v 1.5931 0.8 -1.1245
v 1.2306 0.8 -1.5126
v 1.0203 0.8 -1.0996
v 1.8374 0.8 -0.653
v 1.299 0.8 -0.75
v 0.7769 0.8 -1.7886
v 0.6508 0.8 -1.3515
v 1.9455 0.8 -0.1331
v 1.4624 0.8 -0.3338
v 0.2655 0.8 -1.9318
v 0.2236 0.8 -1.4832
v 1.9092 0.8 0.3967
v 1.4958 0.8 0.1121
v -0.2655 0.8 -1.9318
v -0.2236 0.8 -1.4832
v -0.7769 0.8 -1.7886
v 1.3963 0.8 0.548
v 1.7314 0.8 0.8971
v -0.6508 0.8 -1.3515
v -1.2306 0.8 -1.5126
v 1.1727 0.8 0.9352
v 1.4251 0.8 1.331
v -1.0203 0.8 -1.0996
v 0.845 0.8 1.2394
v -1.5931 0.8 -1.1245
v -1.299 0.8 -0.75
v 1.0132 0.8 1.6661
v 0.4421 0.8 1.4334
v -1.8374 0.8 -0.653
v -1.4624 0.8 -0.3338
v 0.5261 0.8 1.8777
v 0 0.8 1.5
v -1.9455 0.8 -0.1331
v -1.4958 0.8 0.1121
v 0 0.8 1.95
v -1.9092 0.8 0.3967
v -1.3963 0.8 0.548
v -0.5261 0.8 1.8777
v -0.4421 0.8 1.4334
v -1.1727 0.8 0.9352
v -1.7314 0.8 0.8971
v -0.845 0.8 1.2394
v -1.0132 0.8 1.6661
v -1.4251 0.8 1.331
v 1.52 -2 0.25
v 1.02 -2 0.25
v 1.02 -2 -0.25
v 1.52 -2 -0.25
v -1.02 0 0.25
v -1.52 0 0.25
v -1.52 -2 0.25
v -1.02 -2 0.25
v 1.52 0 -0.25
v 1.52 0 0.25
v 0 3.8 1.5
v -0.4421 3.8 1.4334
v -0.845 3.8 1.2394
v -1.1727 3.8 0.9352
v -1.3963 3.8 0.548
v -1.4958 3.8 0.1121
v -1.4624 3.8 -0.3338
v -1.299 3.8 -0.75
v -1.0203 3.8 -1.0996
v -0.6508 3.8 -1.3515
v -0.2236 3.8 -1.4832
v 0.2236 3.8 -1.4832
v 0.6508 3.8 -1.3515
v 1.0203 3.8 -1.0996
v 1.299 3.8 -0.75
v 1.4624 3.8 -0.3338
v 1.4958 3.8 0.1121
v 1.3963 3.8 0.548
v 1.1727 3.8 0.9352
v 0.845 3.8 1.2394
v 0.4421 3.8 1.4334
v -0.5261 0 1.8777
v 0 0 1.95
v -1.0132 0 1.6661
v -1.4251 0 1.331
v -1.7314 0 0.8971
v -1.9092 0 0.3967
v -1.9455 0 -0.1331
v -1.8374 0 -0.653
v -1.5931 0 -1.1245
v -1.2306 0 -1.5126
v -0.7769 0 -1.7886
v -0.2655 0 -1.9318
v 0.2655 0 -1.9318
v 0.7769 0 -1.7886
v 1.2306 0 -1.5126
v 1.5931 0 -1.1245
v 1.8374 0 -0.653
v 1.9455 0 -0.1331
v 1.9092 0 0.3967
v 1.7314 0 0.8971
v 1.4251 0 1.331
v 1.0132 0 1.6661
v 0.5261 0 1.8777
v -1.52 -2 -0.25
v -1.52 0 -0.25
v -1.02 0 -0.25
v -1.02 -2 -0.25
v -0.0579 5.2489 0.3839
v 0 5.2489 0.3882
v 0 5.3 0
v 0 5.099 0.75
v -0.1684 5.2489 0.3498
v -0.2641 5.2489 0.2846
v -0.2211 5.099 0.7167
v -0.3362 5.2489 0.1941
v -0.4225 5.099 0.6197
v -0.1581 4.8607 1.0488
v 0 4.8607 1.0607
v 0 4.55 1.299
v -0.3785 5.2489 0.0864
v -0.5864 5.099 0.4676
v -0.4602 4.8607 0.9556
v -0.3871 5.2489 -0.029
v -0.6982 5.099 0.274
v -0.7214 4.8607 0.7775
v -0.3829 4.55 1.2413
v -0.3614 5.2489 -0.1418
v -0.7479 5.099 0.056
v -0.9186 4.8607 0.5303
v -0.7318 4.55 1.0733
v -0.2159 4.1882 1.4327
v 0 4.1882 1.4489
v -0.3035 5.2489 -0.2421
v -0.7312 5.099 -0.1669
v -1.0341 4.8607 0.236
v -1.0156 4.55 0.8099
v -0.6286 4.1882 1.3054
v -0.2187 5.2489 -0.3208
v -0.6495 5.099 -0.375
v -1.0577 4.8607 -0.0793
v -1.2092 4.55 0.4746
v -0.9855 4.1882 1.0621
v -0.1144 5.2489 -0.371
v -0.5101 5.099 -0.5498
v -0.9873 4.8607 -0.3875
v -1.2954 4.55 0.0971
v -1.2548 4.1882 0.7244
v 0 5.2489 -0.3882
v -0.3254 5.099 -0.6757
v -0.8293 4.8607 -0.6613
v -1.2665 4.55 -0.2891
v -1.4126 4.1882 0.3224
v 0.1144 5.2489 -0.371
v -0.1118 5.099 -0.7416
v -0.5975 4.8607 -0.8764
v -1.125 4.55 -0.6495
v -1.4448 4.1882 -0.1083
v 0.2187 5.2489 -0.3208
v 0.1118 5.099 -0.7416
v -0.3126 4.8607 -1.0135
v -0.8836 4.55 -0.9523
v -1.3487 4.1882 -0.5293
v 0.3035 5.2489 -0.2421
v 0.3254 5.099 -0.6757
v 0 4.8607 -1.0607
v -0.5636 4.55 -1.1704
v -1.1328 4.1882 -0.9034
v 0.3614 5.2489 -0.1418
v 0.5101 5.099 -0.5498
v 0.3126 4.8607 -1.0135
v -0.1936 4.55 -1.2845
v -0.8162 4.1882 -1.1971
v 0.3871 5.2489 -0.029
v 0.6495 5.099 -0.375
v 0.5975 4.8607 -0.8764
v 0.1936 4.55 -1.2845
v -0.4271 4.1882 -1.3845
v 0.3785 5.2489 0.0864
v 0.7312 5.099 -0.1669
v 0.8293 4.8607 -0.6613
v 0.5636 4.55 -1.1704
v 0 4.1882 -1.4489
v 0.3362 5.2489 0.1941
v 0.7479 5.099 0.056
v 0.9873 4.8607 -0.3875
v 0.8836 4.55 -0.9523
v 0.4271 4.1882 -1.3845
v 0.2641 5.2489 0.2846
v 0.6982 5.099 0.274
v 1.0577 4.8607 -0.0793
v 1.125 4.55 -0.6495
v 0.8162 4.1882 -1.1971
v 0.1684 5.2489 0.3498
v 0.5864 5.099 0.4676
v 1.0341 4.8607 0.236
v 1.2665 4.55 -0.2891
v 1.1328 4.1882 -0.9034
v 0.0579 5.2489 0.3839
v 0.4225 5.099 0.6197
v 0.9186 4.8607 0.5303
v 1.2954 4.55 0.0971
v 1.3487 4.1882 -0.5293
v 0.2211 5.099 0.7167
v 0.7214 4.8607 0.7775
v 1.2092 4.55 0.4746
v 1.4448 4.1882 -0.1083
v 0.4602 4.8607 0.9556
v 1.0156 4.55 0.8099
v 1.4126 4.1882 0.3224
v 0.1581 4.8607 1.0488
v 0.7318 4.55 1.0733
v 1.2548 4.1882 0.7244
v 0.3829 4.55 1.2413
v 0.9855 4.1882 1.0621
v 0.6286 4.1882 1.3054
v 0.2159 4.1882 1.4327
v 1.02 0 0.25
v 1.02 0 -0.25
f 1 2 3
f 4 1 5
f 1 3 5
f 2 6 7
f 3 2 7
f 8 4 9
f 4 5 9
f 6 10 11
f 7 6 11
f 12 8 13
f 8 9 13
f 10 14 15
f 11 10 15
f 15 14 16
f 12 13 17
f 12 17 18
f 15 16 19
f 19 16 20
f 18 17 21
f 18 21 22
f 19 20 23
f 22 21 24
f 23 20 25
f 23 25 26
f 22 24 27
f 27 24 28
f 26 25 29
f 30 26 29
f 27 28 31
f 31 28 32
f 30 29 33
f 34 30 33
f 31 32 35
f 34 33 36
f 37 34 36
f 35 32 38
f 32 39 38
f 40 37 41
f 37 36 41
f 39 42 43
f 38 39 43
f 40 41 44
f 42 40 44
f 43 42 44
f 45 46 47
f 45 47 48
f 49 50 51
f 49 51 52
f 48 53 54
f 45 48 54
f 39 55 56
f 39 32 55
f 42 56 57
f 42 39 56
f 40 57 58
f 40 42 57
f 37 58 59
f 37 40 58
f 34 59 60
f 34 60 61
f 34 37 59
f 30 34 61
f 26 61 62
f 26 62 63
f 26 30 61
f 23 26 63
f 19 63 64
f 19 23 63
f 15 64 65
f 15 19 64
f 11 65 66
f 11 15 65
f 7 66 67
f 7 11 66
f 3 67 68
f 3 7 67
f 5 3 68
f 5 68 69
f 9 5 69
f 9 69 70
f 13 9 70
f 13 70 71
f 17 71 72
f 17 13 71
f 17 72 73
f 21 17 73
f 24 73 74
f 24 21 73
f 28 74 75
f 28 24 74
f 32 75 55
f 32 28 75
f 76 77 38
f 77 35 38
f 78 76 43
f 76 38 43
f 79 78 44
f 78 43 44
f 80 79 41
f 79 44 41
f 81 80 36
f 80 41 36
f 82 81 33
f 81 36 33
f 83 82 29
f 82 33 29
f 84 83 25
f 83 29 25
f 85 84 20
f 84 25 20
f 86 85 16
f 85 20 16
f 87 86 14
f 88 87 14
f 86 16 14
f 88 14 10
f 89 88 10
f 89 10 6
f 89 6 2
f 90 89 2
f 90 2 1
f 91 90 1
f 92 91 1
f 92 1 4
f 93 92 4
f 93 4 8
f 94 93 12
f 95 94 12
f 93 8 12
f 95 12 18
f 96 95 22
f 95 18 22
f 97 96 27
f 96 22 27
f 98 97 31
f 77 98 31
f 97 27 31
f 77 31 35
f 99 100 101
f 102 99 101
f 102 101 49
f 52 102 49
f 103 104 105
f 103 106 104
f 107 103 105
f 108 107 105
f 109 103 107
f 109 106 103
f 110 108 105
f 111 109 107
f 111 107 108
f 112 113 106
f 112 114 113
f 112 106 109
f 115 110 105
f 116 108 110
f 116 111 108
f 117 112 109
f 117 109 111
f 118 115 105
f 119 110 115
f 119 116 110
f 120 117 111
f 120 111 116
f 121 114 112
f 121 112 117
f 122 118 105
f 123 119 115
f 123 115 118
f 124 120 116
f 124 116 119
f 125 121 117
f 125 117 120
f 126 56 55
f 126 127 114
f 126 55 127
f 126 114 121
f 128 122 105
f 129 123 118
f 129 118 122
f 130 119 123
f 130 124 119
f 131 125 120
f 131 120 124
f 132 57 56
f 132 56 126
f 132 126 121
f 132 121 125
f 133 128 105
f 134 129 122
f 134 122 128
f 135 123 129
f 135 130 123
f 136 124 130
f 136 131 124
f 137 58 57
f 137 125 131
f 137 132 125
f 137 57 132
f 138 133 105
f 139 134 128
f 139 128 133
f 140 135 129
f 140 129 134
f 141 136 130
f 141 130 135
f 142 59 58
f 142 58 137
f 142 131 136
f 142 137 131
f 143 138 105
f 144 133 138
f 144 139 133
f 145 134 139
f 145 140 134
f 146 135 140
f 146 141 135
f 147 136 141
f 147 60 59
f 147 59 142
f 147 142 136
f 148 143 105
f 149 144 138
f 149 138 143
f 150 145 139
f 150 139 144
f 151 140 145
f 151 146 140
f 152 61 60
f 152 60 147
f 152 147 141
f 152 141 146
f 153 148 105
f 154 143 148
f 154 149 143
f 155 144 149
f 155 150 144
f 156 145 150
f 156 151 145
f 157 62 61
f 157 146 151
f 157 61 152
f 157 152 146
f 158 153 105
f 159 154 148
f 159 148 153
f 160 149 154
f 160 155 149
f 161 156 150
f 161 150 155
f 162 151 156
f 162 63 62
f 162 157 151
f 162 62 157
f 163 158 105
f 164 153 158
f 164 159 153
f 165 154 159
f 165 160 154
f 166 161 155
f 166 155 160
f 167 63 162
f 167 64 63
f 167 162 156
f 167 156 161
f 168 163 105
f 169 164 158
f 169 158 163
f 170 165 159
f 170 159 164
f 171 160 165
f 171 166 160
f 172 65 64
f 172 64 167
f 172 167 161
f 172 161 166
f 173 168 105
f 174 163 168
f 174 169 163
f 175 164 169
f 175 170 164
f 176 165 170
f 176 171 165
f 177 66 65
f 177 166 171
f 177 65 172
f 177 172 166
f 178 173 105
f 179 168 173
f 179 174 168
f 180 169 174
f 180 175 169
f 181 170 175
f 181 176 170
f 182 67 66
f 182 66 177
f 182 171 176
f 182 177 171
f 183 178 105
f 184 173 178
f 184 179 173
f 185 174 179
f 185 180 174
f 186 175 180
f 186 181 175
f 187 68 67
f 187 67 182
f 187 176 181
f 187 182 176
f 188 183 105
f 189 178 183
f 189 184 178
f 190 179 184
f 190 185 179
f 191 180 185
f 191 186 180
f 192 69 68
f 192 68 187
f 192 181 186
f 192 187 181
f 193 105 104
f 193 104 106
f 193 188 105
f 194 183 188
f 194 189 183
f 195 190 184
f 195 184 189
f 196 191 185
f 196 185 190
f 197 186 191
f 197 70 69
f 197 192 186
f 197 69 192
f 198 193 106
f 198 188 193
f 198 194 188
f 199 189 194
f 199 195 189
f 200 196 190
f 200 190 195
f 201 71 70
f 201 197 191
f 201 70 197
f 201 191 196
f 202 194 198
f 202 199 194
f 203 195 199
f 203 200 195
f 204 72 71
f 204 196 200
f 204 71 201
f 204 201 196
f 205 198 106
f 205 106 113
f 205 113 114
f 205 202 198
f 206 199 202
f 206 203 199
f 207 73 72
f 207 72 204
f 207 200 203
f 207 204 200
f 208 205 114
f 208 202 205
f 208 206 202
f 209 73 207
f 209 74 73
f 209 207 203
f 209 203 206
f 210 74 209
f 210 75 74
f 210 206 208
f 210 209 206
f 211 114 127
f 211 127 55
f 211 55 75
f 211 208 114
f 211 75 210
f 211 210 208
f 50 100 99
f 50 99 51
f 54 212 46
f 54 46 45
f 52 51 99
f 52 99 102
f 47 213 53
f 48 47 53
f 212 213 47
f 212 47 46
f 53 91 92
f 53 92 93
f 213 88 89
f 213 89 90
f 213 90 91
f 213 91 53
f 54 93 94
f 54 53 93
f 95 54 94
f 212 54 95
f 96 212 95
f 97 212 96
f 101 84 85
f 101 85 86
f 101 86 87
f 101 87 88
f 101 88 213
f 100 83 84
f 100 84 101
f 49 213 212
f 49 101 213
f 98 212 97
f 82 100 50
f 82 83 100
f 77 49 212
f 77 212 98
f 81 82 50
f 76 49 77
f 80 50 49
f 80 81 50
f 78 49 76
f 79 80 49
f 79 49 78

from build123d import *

# Parameters (mm, degrees)
SKETCH_1_W      = 1.95
SKETCH_1_H      = 0.8
SKETCH_2_W      = 0.5
SKETCH_2_H      = 0.5
EXTRUDE_1_DEPTH = 2


with BuildPart() as part:
    # Эскиз1 → Повернуть1 (revolve)
    with BuildSketch(Plane.XY, mode=Mode.PRIVATE) as revolve_1_sk:
        with BuildLine():
            Line((-1.5, 0.8), (0, 0.8))
            Line((0, 0.8), (0, 5.3))
            ThreePointArc((0, 5.3), (-1.060660172, 4.860660172), (-1.5, 3.8))
            Line((-1.5, 3.8), (-1.5, 0.8))
        make_face()
        with Locations((-0.975, 0.4)):
            Rectangle(SKETCH_1_W, SKETCH_1_H)
    revolve(revolve_1_sk.sketch.rotate(Axis((0, 8.783857323, 0), (0, -1, 0)), 270), axis=Axis((0, 8.783857323, 0), (0, -1, 0)))

    # Эскиз2 → Бобышка-Вытянуть1 (add)
    with BuildSketch(Plane.XZ):
        with Locations((-1.27, 0)):
            Rectangle(SKETCH_2_W, SKETCH_2_H)
        with Locations((1.27, 0)):
            Rectangle(SKETCH_2_W, SKETCH_2_H)
    extrude(amount=EXTRUDE_1_DEPTH)


solid = part.part
